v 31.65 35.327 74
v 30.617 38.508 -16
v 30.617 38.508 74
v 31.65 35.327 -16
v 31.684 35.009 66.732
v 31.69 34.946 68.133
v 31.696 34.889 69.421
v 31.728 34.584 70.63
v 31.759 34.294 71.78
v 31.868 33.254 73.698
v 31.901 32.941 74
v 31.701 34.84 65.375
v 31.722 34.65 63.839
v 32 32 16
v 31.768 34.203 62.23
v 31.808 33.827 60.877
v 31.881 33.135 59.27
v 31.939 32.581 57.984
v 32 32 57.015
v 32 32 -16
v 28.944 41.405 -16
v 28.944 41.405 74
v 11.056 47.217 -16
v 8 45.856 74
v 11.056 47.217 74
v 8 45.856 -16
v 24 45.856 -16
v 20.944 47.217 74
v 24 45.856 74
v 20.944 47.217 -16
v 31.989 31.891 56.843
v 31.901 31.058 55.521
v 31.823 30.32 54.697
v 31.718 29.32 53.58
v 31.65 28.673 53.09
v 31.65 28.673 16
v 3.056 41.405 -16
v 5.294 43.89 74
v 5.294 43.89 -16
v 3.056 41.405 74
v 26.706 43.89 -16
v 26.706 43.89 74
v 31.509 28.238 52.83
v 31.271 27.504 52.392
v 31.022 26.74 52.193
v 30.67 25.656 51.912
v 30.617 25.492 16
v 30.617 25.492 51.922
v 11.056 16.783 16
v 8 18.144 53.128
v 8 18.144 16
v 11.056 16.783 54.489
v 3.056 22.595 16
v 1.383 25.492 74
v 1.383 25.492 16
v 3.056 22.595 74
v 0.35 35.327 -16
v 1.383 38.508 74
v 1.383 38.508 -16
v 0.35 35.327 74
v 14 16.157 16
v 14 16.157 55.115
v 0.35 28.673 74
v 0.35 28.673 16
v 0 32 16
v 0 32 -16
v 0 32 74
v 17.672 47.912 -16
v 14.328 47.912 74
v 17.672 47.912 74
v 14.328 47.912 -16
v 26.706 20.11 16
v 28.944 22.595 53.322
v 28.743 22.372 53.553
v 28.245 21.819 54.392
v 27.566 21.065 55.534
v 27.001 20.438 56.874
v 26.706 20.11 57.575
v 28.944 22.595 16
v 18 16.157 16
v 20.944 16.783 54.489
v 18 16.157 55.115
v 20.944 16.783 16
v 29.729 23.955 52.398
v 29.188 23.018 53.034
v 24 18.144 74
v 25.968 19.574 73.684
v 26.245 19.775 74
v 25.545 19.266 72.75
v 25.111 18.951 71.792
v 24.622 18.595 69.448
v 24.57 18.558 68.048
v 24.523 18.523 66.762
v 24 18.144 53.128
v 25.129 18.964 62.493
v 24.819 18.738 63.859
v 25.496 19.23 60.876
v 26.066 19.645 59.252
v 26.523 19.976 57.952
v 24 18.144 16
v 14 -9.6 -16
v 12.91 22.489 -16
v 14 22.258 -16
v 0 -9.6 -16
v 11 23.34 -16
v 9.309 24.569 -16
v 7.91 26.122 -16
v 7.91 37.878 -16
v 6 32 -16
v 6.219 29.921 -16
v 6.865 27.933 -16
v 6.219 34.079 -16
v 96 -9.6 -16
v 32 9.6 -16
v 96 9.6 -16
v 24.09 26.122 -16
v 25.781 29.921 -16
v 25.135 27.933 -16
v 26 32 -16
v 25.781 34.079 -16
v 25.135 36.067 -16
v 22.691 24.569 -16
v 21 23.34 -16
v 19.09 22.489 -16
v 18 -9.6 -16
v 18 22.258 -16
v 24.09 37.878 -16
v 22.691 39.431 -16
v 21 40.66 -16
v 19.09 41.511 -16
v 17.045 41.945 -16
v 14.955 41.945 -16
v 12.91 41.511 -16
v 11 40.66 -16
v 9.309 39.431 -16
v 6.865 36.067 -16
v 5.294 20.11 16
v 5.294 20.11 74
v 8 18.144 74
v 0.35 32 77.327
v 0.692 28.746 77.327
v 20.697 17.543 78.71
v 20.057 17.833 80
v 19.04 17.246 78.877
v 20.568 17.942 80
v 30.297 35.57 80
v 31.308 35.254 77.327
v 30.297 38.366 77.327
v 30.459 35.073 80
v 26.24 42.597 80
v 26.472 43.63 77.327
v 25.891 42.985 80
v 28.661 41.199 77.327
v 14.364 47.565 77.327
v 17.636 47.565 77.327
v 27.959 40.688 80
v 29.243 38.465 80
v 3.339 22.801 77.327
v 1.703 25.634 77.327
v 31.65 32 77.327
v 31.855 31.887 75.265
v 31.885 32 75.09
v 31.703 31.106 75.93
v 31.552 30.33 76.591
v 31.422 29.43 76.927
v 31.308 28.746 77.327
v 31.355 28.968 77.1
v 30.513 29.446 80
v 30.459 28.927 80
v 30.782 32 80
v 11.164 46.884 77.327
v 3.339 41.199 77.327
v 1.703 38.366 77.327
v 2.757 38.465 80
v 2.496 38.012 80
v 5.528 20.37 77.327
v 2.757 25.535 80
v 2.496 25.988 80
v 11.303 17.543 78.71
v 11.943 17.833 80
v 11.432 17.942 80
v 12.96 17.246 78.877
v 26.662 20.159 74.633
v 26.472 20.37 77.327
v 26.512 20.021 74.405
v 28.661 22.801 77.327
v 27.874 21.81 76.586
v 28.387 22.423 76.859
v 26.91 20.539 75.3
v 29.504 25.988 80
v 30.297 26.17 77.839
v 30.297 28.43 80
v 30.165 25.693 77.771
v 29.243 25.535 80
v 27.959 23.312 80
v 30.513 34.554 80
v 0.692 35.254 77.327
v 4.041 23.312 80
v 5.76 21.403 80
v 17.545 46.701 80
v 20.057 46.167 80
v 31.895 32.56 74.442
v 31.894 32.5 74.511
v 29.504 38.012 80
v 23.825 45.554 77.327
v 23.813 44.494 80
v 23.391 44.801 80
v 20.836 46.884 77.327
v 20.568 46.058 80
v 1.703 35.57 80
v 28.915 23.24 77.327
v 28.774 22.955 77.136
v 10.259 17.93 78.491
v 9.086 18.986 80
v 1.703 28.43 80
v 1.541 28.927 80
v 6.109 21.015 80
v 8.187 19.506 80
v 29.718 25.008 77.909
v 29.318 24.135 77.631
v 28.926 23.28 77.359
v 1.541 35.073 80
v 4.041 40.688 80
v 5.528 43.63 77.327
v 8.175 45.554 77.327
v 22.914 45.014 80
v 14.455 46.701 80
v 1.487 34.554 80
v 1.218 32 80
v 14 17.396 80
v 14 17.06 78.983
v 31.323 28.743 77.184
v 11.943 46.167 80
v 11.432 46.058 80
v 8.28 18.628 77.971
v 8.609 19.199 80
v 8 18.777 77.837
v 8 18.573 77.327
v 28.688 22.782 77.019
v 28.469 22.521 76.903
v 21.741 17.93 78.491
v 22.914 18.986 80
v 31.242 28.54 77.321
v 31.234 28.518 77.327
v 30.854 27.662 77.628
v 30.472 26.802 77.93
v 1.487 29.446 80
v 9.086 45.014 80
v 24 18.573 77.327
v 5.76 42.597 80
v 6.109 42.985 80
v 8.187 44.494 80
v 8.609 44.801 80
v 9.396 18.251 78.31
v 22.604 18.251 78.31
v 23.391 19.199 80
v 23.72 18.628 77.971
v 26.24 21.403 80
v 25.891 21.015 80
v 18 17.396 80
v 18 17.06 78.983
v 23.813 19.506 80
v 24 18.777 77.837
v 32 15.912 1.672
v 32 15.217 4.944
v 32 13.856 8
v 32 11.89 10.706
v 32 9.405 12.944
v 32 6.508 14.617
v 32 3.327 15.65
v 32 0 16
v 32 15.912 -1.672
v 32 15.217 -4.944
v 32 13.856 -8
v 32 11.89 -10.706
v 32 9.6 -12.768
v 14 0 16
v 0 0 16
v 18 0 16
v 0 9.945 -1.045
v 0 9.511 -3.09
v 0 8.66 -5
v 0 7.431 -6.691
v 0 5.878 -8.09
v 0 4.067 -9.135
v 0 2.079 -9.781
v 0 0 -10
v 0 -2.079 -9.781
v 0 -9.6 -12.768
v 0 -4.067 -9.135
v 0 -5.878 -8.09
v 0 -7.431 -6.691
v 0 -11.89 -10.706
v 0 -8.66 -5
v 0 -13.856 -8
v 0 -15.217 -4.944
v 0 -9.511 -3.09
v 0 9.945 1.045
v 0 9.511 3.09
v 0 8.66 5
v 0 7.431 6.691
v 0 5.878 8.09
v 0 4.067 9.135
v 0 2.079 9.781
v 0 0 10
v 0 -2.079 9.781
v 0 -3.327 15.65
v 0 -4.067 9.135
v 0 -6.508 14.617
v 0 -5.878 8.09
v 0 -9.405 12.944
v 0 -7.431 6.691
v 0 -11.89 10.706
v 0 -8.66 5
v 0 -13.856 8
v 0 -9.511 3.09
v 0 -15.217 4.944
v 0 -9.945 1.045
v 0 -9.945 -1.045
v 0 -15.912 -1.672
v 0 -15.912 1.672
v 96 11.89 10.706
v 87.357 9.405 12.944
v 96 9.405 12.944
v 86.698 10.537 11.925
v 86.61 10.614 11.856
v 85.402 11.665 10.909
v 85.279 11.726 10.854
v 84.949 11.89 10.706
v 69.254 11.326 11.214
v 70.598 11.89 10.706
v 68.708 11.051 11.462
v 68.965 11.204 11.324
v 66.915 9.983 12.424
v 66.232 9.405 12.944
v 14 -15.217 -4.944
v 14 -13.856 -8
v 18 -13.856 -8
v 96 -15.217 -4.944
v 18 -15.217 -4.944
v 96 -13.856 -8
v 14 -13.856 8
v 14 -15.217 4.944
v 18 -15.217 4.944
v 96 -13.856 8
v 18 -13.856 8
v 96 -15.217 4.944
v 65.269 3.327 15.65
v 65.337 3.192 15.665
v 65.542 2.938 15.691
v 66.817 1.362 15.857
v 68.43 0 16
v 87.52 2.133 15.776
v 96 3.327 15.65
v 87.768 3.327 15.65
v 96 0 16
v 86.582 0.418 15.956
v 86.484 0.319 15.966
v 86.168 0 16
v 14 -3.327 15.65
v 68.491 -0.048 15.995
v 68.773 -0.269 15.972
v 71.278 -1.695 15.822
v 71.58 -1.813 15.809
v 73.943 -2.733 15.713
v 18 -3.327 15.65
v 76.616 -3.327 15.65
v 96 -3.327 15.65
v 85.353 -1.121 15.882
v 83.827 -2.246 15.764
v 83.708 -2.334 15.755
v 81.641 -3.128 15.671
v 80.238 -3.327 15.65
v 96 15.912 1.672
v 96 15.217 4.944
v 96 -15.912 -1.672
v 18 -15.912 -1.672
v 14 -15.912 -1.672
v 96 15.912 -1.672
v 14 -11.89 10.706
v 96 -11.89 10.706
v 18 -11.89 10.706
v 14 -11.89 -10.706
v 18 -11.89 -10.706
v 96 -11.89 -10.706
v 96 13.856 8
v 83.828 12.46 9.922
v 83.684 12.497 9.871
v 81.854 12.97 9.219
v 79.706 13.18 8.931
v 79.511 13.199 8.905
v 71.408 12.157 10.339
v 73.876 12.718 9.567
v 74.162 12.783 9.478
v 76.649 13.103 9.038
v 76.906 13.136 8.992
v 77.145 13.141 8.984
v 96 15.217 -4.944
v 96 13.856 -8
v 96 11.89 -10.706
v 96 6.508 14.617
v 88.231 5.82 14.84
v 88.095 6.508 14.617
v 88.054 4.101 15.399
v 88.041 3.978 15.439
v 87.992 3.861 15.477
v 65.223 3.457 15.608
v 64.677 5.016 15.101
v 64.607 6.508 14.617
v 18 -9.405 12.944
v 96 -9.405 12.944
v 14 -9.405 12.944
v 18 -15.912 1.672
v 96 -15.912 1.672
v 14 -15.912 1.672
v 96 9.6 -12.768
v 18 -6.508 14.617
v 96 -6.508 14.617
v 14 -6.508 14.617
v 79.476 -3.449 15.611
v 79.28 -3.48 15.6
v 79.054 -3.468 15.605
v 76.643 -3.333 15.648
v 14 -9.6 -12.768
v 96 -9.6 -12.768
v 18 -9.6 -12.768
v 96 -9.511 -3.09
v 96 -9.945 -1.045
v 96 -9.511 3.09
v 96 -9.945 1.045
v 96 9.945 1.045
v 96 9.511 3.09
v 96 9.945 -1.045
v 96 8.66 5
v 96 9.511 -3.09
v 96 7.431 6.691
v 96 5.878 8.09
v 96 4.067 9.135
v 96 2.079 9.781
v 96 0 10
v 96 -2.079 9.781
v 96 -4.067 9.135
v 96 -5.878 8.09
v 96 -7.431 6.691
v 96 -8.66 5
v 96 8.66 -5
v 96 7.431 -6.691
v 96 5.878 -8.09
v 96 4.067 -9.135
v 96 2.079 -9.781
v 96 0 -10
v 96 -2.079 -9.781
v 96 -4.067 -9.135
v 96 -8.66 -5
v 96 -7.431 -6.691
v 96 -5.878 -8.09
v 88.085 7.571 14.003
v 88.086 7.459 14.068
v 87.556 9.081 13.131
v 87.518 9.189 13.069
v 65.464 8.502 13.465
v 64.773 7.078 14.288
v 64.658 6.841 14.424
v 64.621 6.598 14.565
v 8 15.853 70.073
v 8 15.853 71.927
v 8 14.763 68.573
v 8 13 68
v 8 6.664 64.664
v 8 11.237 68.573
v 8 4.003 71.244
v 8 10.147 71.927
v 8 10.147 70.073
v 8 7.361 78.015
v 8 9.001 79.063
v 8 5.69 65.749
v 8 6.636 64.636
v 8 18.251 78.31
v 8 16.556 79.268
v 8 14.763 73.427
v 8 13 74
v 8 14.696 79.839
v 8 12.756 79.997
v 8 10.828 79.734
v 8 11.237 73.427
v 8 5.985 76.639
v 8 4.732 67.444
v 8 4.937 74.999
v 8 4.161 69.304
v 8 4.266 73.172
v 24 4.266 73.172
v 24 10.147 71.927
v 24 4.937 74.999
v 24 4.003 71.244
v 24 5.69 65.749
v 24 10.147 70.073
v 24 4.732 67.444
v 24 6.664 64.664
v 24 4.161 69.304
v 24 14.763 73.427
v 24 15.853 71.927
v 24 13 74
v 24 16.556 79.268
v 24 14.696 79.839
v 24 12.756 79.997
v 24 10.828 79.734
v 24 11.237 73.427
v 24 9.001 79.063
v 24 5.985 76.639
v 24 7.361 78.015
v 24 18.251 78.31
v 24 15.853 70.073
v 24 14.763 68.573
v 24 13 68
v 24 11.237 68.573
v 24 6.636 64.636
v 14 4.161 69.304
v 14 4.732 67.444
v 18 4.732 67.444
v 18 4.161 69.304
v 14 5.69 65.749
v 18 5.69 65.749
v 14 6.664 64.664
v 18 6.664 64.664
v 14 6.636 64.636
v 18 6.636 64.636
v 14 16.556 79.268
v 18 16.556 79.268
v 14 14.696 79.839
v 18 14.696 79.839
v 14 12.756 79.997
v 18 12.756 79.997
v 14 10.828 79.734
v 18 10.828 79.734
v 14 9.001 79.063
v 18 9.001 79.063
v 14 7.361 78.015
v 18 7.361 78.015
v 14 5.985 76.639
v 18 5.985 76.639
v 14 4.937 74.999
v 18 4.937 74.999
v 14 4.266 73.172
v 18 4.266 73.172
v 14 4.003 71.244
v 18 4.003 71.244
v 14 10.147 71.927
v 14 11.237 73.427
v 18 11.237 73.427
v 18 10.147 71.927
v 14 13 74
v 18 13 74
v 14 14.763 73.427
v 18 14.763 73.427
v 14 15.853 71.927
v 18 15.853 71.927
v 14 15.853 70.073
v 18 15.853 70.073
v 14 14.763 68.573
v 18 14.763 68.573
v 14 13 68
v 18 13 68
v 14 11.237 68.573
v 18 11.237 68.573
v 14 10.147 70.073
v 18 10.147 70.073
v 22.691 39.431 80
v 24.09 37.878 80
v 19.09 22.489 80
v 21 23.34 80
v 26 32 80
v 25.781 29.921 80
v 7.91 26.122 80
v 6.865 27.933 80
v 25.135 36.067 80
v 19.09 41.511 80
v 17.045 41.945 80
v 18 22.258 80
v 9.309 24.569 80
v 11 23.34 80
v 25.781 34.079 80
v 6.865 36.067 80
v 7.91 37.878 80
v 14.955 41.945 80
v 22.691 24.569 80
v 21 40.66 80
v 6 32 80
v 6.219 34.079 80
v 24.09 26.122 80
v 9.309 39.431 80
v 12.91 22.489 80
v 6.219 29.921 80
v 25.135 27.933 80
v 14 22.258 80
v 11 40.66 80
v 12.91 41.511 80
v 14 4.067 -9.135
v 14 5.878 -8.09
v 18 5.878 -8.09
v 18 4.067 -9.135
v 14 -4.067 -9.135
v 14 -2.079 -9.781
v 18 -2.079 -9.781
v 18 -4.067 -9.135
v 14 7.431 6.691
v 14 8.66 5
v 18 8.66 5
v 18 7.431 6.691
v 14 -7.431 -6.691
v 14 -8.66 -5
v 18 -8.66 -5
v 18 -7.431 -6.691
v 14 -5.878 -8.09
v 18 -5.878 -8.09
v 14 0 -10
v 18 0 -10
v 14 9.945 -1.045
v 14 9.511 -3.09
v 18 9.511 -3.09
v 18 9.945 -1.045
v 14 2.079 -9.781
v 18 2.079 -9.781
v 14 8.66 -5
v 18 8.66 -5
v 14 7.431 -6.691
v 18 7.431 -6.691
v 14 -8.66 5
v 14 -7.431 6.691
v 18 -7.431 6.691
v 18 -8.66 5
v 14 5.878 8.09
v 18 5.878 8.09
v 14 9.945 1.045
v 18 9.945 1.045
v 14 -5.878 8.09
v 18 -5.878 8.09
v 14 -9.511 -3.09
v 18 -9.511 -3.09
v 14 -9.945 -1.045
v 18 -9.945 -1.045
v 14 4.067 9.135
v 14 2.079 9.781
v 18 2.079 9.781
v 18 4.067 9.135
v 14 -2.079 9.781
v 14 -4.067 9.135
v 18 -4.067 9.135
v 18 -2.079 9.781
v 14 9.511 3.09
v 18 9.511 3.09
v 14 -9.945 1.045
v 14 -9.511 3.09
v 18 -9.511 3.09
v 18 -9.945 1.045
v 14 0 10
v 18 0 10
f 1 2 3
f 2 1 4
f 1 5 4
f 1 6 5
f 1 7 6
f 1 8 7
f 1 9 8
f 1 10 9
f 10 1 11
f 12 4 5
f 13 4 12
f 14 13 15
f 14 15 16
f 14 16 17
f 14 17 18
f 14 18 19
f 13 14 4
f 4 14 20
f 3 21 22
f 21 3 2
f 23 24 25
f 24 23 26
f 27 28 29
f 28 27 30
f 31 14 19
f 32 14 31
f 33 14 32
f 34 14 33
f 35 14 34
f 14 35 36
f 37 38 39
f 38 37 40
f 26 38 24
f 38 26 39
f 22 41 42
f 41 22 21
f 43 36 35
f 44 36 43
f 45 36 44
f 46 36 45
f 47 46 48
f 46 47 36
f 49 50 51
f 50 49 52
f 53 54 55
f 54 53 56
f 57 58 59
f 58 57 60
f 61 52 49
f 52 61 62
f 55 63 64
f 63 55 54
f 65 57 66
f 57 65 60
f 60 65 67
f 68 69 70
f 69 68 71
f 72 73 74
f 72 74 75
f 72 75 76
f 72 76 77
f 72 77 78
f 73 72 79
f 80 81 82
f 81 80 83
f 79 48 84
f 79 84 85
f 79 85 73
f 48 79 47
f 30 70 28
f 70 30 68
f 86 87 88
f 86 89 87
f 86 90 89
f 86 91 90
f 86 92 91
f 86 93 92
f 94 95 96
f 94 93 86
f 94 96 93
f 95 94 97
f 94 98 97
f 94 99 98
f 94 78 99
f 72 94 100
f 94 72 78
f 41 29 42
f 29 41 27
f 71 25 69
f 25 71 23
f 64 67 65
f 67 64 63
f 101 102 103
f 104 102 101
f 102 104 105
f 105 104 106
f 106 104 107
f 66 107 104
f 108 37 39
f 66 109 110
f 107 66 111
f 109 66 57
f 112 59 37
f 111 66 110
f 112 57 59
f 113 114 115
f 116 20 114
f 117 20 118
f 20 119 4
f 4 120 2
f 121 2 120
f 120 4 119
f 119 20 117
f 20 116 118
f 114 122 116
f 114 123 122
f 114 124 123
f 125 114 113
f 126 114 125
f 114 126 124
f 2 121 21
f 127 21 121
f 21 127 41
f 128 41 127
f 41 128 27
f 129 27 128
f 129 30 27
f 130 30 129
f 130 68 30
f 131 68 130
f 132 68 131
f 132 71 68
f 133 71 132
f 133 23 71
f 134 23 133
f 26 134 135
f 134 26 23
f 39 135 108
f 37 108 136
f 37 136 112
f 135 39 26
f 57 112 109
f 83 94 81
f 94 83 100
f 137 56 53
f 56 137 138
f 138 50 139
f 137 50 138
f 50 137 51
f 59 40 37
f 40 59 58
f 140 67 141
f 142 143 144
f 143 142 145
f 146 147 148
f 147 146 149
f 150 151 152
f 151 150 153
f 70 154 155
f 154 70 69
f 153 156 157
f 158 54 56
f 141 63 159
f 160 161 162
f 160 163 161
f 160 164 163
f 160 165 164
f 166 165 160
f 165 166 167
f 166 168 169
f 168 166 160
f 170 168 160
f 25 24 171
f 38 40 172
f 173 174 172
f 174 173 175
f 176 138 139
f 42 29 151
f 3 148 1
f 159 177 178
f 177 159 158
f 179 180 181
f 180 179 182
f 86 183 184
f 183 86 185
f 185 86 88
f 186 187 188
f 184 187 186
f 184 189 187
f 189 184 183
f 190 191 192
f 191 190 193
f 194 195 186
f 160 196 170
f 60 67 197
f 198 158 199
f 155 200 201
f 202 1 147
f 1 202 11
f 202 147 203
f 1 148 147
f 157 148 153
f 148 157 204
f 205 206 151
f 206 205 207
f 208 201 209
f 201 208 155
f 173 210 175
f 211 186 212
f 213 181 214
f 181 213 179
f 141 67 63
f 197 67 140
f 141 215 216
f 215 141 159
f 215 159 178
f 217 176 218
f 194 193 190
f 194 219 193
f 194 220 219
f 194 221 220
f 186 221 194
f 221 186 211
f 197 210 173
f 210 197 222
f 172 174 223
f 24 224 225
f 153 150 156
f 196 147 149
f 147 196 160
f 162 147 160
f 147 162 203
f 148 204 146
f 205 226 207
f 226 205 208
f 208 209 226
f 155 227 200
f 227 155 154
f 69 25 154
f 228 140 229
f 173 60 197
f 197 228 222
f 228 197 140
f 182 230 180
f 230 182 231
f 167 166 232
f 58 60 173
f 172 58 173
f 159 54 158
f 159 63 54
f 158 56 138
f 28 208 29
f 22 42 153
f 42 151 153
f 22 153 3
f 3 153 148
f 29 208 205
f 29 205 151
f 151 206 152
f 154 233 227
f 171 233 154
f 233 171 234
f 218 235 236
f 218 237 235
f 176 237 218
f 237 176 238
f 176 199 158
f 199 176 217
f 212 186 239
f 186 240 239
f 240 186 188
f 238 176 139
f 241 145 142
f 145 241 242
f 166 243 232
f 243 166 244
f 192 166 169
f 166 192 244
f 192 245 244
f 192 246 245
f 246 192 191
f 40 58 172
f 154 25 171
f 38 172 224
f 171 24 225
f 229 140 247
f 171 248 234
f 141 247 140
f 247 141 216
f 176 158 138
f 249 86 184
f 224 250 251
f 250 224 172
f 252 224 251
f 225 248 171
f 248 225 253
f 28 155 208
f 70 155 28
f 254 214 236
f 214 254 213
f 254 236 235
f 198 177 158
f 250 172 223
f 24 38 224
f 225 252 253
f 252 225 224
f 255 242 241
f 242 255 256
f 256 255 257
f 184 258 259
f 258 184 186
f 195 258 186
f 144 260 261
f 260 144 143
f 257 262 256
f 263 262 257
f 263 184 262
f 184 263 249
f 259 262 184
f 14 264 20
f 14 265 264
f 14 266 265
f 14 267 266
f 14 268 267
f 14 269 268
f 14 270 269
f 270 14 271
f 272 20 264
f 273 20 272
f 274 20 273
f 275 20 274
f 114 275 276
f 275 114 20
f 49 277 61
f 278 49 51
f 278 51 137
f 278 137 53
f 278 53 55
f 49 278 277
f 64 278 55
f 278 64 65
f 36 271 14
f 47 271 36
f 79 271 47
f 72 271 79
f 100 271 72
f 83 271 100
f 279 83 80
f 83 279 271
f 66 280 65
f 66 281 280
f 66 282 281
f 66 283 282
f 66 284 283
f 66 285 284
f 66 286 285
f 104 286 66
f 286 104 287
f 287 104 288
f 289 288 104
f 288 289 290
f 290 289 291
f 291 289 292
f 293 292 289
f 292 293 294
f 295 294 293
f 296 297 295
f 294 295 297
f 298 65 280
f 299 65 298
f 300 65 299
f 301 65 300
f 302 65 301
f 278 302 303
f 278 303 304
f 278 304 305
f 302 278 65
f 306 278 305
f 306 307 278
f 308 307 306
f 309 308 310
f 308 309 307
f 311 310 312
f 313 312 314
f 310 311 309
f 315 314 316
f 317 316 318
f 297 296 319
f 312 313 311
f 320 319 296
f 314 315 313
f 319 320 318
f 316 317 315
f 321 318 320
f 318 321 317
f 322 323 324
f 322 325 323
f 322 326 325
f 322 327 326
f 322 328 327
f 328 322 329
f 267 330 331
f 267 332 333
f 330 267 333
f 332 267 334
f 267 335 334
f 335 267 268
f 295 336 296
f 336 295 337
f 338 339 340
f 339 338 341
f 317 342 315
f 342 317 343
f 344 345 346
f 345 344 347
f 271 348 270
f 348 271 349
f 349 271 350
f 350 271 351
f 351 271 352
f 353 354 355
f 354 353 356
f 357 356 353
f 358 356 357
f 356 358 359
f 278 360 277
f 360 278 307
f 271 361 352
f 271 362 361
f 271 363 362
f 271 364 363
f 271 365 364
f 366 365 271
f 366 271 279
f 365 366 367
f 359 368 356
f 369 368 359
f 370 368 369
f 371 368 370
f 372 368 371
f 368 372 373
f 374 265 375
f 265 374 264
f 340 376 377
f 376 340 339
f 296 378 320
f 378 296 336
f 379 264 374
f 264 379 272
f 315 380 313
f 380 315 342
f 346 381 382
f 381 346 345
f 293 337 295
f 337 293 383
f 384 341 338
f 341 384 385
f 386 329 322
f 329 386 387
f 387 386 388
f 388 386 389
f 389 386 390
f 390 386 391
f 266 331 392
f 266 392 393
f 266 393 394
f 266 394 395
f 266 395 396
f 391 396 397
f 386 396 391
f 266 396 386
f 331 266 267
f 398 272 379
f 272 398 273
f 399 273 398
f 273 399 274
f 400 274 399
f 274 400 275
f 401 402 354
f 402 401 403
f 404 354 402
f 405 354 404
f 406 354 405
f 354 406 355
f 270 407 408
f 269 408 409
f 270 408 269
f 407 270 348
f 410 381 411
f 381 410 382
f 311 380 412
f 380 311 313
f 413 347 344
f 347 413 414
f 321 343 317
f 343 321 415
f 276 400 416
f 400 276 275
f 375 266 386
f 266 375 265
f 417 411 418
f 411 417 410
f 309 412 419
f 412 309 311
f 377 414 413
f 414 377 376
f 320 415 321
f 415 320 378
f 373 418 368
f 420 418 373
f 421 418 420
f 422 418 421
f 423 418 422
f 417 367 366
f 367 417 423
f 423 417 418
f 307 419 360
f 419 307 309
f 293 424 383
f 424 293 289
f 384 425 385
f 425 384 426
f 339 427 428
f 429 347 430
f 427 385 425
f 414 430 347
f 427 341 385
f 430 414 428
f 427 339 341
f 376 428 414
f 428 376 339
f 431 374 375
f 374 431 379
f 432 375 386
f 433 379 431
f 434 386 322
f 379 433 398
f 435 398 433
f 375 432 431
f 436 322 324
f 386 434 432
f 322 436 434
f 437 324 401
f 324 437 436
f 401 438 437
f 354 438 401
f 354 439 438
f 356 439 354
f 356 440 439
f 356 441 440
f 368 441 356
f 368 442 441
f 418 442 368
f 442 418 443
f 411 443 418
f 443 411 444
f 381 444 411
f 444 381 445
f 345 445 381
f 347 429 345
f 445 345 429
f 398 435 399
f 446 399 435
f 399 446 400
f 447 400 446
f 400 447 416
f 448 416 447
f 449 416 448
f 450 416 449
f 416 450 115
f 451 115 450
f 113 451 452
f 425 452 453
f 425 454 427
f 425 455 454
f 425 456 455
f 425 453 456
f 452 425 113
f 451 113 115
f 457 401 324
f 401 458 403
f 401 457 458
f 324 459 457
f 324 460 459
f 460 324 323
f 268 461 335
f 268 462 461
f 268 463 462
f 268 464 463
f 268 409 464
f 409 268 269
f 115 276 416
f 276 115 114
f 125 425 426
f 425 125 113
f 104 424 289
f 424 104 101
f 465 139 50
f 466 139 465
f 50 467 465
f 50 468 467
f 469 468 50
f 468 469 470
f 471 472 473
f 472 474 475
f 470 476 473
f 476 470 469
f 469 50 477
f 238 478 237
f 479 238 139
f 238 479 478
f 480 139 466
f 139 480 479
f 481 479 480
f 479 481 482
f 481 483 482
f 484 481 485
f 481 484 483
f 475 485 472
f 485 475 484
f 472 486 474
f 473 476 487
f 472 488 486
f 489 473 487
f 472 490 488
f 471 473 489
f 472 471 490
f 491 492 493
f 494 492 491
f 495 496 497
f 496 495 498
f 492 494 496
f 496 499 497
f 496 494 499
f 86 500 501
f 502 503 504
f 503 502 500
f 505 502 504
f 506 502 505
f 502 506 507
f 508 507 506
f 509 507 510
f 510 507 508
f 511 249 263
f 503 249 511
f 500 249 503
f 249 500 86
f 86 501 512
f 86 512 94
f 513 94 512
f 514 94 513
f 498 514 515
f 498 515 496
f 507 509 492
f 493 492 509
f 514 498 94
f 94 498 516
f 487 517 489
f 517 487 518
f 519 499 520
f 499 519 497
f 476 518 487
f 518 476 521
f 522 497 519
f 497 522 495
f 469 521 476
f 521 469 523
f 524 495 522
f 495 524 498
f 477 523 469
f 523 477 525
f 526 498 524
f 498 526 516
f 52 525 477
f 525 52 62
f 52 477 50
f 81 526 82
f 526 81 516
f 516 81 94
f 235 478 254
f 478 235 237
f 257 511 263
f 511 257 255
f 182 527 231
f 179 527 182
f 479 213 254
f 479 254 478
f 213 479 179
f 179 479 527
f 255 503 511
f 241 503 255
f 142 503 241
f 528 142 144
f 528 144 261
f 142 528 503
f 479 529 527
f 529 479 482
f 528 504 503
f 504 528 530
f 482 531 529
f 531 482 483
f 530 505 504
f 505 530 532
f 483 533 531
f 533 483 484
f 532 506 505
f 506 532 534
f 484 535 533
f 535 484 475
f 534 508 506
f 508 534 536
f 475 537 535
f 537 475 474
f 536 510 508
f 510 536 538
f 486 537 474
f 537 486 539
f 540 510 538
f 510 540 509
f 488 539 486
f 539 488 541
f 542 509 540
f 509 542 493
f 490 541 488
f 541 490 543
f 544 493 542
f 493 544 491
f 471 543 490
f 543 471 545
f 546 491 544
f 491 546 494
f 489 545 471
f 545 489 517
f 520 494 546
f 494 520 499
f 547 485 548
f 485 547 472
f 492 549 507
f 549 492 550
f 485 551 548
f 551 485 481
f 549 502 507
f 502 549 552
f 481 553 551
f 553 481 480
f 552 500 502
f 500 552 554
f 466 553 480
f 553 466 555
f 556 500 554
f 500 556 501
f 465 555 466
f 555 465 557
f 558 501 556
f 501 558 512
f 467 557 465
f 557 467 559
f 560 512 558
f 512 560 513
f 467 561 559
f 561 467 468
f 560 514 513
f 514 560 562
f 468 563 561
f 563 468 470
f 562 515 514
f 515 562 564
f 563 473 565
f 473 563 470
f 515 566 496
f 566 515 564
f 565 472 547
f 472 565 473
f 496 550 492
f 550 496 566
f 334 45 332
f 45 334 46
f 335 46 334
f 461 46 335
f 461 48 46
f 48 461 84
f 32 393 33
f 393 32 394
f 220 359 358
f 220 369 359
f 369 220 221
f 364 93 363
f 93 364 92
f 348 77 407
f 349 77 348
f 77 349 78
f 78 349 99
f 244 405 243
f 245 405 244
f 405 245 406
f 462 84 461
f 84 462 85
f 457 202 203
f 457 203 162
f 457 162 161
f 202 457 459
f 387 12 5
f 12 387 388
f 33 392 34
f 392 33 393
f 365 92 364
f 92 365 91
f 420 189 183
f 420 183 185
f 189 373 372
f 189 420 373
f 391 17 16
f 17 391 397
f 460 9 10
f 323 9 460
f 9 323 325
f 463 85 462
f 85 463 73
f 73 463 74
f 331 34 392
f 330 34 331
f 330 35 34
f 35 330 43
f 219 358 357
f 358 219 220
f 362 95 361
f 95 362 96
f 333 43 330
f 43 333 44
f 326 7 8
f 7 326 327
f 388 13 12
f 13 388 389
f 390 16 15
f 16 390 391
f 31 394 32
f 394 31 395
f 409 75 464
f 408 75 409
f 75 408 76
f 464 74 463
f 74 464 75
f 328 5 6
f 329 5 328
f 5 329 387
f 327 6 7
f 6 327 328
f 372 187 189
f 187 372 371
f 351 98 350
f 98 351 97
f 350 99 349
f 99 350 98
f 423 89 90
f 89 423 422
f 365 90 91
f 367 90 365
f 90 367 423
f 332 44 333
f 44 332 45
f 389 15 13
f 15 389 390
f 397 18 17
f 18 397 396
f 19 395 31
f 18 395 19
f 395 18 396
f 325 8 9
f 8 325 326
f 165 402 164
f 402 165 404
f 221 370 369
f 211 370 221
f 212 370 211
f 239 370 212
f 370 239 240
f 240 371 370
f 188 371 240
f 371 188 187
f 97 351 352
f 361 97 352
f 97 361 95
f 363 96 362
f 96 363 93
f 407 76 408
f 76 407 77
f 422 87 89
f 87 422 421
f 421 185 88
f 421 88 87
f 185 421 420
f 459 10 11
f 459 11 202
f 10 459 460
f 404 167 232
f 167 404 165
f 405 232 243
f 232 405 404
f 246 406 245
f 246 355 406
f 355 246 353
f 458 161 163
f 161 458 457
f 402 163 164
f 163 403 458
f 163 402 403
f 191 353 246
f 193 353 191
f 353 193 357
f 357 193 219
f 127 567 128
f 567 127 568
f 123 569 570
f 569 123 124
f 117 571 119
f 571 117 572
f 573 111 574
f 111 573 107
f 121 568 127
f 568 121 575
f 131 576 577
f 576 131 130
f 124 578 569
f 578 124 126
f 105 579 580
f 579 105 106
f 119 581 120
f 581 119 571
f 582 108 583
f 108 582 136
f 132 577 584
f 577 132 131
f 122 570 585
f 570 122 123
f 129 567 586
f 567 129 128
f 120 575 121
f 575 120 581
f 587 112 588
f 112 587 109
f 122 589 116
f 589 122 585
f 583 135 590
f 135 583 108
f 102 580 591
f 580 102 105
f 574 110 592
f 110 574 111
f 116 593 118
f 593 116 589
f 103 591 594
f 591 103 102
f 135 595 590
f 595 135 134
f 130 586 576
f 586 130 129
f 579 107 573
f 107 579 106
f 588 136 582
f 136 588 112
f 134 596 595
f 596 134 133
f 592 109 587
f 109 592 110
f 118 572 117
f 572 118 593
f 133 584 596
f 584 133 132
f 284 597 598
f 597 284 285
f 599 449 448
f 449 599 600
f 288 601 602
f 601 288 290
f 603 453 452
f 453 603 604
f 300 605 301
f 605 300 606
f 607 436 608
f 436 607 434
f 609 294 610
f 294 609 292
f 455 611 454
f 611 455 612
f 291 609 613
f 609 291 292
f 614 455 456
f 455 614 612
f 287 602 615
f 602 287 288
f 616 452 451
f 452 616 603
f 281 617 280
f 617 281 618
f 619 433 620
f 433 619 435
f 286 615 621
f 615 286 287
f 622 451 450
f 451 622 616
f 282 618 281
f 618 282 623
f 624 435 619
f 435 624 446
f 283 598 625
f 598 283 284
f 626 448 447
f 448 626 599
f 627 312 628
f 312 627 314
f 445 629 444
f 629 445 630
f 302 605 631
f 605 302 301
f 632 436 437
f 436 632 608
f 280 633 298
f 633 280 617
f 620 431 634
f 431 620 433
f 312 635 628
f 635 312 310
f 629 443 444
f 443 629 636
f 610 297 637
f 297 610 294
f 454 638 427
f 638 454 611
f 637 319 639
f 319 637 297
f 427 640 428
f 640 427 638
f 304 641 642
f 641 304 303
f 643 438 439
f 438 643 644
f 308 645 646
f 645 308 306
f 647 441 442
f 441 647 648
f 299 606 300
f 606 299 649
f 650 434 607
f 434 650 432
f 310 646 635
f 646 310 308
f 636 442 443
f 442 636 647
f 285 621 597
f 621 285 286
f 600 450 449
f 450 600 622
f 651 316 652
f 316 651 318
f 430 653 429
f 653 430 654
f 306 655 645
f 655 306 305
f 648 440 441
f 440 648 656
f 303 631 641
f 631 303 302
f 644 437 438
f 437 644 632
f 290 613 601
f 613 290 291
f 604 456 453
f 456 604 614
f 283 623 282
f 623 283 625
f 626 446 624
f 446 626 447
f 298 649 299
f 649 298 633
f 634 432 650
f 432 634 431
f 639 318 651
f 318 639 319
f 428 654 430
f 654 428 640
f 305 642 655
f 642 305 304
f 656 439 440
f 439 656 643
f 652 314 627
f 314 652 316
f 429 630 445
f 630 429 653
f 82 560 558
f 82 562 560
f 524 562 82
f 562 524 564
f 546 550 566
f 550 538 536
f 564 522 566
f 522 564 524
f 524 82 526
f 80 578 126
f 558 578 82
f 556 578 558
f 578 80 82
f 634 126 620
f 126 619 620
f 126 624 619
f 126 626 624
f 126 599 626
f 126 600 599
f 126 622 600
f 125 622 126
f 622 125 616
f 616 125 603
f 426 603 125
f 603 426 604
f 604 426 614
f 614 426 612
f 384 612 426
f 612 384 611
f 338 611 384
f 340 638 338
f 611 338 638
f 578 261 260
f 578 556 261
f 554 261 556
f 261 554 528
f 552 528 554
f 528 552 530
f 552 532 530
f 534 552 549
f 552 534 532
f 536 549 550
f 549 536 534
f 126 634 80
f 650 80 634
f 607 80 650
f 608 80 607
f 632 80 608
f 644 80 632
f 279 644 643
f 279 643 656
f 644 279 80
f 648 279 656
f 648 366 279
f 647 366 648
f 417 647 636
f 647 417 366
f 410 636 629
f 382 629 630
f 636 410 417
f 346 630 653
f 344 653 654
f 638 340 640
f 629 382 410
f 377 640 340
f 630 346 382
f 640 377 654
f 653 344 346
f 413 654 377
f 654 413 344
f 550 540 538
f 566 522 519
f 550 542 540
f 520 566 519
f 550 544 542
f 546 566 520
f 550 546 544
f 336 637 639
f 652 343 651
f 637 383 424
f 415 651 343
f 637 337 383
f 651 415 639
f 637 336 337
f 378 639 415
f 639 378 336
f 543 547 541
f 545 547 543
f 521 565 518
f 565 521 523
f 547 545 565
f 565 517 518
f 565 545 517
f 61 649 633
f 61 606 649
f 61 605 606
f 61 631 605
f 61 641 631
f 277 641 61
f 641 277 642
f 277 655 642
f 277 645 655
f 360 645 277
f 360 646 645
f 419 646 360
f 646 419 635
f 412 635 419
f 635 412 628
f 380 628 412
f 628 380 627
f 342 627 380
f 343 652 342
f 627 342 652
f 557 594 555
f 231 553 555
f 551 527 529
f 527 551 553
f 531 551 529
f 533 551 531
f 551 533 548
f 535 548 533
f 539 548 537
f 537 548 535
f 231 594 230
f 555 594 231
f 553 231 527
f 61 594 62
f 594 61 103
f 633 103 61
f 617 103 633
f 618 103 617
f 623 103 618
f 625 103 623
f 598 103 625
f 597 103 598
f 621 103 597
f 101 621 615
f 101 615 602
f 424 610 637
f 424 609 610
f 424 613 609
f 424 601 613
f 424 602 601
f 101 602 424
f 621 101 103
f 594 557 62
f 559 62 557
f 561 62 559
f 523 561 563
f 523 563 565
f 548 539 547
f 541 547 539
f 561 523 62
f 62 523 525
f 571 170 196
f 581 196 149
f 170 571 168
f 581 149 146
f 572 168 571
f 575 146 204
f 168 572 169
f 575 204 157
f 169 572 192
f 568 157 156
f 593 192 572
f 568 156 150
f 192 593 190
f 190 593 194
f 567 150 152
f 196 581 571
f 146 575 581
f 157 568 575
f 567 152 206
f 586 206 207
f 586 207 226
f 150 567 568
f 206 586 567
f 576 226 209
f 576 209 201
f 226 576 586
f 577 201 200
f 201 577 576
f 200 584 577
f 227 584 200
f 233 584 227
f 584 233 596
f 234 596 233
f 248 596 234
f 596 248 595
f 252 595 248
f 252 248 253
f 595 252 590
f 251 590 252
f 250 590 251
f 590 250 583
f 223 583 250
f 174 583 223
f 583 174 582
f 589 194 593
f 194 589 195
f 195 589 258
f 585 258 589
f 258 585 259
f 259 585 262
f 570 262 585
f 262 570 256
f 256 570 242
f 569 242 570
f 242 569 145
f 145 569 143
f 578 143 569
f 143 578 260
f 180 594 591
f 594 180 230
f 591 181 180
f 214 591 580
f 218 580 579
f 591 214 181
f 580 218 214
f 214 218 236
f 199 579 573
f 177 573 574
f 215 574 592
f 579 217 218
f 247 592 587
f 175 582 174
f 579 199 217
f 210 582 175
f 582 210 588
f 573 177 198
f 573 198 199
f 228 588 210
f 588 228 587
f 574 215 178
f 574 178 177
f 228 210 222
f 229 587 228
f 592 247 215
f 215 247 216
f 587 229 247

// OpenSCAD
//
//  Copyright (C) 09-04-2013 Jasper den Ouden.
//
//  This is free software: you can redistribute it and/or modify
//  it under the terms of the GNU General Public License as published
//  by the Free Software Foundation, either version 3 of the License, or
//  (at your option) any later version.
//

//Version more specific about how the z rod is held.
//Note that it probably doesnt help much at all. The corner pieces could help
// more but ultimately..
//
// Hmm, perhaps a steel crossbar vertically would be the most efffective against
// x-wobble? Basically tighten it there.

rr = 10; //Z-rod radius.
rb = 10; //Horizontal rod radius.
t = 6; //Thickness.
l = 6*(rr+t); //Length. (> 2* is extra)
h = l;  //height(idem)

sr = 3; //Smaller screw radius.

cd = 4; //width of cut for the clamping.

d = rr+rb+2*t;//Distance between rods. TODO

cw = 2*t+cd; //Width of clamp on top.
cr = sr + t; //Radius, idem.

module z_rod_holder()
{
    difference()
    {
        union()
        {
            translate([rr+t,d,-rr-t]) 
            {   cylinder(r=rr+t, h = h-t);
                translate([0,0,h-t]) sphere(rr+t);
            }
            
            translate([rr+t,d/2]) cube(2*[rr+t,d/2,rb+t], center=true);
            rotate([0,90]) cylinder(r=rb+t, h = l);
            translate([l/2,0,-(rb+t)/2]) cube([l,1.2*(rb+t),rb+t], center=true);

            
            translate([rr+t-cw/2,rr+t-sr,h-rr-t-cr]) rotate([0,90]) linear_extrude(height=cw)
                difference()
            {   rotate(45)  union()
                {   circle(cr);
                    translate([cr,0]) square(2*[cr,cr], center=true);
                }
                circle(sr);
            }
            translate([l-t,0]) rotate(180-atan(d/(l-t-rr-t))) rotate([0,45])//atan(h/(l-t))]) 
                cylinder(r=1.5*t,h=200);
        }
        translate([rr+t,d,-rr-t-h]) cylinder(r=rr, h = 3*h);
        translate([-l,0]) rotate([0,90]) cylinder(r=rb, h = 3*l);
        translate([rr+t,2*(rr+t)-(l+h)/2]) cube([cd,l+h,3*h], center=true);
        translate([0,0,2*h+l-rb-t]) cube(2*(h+l)*[1,1,1], center=true);
    }
}

z_rod_holder();
